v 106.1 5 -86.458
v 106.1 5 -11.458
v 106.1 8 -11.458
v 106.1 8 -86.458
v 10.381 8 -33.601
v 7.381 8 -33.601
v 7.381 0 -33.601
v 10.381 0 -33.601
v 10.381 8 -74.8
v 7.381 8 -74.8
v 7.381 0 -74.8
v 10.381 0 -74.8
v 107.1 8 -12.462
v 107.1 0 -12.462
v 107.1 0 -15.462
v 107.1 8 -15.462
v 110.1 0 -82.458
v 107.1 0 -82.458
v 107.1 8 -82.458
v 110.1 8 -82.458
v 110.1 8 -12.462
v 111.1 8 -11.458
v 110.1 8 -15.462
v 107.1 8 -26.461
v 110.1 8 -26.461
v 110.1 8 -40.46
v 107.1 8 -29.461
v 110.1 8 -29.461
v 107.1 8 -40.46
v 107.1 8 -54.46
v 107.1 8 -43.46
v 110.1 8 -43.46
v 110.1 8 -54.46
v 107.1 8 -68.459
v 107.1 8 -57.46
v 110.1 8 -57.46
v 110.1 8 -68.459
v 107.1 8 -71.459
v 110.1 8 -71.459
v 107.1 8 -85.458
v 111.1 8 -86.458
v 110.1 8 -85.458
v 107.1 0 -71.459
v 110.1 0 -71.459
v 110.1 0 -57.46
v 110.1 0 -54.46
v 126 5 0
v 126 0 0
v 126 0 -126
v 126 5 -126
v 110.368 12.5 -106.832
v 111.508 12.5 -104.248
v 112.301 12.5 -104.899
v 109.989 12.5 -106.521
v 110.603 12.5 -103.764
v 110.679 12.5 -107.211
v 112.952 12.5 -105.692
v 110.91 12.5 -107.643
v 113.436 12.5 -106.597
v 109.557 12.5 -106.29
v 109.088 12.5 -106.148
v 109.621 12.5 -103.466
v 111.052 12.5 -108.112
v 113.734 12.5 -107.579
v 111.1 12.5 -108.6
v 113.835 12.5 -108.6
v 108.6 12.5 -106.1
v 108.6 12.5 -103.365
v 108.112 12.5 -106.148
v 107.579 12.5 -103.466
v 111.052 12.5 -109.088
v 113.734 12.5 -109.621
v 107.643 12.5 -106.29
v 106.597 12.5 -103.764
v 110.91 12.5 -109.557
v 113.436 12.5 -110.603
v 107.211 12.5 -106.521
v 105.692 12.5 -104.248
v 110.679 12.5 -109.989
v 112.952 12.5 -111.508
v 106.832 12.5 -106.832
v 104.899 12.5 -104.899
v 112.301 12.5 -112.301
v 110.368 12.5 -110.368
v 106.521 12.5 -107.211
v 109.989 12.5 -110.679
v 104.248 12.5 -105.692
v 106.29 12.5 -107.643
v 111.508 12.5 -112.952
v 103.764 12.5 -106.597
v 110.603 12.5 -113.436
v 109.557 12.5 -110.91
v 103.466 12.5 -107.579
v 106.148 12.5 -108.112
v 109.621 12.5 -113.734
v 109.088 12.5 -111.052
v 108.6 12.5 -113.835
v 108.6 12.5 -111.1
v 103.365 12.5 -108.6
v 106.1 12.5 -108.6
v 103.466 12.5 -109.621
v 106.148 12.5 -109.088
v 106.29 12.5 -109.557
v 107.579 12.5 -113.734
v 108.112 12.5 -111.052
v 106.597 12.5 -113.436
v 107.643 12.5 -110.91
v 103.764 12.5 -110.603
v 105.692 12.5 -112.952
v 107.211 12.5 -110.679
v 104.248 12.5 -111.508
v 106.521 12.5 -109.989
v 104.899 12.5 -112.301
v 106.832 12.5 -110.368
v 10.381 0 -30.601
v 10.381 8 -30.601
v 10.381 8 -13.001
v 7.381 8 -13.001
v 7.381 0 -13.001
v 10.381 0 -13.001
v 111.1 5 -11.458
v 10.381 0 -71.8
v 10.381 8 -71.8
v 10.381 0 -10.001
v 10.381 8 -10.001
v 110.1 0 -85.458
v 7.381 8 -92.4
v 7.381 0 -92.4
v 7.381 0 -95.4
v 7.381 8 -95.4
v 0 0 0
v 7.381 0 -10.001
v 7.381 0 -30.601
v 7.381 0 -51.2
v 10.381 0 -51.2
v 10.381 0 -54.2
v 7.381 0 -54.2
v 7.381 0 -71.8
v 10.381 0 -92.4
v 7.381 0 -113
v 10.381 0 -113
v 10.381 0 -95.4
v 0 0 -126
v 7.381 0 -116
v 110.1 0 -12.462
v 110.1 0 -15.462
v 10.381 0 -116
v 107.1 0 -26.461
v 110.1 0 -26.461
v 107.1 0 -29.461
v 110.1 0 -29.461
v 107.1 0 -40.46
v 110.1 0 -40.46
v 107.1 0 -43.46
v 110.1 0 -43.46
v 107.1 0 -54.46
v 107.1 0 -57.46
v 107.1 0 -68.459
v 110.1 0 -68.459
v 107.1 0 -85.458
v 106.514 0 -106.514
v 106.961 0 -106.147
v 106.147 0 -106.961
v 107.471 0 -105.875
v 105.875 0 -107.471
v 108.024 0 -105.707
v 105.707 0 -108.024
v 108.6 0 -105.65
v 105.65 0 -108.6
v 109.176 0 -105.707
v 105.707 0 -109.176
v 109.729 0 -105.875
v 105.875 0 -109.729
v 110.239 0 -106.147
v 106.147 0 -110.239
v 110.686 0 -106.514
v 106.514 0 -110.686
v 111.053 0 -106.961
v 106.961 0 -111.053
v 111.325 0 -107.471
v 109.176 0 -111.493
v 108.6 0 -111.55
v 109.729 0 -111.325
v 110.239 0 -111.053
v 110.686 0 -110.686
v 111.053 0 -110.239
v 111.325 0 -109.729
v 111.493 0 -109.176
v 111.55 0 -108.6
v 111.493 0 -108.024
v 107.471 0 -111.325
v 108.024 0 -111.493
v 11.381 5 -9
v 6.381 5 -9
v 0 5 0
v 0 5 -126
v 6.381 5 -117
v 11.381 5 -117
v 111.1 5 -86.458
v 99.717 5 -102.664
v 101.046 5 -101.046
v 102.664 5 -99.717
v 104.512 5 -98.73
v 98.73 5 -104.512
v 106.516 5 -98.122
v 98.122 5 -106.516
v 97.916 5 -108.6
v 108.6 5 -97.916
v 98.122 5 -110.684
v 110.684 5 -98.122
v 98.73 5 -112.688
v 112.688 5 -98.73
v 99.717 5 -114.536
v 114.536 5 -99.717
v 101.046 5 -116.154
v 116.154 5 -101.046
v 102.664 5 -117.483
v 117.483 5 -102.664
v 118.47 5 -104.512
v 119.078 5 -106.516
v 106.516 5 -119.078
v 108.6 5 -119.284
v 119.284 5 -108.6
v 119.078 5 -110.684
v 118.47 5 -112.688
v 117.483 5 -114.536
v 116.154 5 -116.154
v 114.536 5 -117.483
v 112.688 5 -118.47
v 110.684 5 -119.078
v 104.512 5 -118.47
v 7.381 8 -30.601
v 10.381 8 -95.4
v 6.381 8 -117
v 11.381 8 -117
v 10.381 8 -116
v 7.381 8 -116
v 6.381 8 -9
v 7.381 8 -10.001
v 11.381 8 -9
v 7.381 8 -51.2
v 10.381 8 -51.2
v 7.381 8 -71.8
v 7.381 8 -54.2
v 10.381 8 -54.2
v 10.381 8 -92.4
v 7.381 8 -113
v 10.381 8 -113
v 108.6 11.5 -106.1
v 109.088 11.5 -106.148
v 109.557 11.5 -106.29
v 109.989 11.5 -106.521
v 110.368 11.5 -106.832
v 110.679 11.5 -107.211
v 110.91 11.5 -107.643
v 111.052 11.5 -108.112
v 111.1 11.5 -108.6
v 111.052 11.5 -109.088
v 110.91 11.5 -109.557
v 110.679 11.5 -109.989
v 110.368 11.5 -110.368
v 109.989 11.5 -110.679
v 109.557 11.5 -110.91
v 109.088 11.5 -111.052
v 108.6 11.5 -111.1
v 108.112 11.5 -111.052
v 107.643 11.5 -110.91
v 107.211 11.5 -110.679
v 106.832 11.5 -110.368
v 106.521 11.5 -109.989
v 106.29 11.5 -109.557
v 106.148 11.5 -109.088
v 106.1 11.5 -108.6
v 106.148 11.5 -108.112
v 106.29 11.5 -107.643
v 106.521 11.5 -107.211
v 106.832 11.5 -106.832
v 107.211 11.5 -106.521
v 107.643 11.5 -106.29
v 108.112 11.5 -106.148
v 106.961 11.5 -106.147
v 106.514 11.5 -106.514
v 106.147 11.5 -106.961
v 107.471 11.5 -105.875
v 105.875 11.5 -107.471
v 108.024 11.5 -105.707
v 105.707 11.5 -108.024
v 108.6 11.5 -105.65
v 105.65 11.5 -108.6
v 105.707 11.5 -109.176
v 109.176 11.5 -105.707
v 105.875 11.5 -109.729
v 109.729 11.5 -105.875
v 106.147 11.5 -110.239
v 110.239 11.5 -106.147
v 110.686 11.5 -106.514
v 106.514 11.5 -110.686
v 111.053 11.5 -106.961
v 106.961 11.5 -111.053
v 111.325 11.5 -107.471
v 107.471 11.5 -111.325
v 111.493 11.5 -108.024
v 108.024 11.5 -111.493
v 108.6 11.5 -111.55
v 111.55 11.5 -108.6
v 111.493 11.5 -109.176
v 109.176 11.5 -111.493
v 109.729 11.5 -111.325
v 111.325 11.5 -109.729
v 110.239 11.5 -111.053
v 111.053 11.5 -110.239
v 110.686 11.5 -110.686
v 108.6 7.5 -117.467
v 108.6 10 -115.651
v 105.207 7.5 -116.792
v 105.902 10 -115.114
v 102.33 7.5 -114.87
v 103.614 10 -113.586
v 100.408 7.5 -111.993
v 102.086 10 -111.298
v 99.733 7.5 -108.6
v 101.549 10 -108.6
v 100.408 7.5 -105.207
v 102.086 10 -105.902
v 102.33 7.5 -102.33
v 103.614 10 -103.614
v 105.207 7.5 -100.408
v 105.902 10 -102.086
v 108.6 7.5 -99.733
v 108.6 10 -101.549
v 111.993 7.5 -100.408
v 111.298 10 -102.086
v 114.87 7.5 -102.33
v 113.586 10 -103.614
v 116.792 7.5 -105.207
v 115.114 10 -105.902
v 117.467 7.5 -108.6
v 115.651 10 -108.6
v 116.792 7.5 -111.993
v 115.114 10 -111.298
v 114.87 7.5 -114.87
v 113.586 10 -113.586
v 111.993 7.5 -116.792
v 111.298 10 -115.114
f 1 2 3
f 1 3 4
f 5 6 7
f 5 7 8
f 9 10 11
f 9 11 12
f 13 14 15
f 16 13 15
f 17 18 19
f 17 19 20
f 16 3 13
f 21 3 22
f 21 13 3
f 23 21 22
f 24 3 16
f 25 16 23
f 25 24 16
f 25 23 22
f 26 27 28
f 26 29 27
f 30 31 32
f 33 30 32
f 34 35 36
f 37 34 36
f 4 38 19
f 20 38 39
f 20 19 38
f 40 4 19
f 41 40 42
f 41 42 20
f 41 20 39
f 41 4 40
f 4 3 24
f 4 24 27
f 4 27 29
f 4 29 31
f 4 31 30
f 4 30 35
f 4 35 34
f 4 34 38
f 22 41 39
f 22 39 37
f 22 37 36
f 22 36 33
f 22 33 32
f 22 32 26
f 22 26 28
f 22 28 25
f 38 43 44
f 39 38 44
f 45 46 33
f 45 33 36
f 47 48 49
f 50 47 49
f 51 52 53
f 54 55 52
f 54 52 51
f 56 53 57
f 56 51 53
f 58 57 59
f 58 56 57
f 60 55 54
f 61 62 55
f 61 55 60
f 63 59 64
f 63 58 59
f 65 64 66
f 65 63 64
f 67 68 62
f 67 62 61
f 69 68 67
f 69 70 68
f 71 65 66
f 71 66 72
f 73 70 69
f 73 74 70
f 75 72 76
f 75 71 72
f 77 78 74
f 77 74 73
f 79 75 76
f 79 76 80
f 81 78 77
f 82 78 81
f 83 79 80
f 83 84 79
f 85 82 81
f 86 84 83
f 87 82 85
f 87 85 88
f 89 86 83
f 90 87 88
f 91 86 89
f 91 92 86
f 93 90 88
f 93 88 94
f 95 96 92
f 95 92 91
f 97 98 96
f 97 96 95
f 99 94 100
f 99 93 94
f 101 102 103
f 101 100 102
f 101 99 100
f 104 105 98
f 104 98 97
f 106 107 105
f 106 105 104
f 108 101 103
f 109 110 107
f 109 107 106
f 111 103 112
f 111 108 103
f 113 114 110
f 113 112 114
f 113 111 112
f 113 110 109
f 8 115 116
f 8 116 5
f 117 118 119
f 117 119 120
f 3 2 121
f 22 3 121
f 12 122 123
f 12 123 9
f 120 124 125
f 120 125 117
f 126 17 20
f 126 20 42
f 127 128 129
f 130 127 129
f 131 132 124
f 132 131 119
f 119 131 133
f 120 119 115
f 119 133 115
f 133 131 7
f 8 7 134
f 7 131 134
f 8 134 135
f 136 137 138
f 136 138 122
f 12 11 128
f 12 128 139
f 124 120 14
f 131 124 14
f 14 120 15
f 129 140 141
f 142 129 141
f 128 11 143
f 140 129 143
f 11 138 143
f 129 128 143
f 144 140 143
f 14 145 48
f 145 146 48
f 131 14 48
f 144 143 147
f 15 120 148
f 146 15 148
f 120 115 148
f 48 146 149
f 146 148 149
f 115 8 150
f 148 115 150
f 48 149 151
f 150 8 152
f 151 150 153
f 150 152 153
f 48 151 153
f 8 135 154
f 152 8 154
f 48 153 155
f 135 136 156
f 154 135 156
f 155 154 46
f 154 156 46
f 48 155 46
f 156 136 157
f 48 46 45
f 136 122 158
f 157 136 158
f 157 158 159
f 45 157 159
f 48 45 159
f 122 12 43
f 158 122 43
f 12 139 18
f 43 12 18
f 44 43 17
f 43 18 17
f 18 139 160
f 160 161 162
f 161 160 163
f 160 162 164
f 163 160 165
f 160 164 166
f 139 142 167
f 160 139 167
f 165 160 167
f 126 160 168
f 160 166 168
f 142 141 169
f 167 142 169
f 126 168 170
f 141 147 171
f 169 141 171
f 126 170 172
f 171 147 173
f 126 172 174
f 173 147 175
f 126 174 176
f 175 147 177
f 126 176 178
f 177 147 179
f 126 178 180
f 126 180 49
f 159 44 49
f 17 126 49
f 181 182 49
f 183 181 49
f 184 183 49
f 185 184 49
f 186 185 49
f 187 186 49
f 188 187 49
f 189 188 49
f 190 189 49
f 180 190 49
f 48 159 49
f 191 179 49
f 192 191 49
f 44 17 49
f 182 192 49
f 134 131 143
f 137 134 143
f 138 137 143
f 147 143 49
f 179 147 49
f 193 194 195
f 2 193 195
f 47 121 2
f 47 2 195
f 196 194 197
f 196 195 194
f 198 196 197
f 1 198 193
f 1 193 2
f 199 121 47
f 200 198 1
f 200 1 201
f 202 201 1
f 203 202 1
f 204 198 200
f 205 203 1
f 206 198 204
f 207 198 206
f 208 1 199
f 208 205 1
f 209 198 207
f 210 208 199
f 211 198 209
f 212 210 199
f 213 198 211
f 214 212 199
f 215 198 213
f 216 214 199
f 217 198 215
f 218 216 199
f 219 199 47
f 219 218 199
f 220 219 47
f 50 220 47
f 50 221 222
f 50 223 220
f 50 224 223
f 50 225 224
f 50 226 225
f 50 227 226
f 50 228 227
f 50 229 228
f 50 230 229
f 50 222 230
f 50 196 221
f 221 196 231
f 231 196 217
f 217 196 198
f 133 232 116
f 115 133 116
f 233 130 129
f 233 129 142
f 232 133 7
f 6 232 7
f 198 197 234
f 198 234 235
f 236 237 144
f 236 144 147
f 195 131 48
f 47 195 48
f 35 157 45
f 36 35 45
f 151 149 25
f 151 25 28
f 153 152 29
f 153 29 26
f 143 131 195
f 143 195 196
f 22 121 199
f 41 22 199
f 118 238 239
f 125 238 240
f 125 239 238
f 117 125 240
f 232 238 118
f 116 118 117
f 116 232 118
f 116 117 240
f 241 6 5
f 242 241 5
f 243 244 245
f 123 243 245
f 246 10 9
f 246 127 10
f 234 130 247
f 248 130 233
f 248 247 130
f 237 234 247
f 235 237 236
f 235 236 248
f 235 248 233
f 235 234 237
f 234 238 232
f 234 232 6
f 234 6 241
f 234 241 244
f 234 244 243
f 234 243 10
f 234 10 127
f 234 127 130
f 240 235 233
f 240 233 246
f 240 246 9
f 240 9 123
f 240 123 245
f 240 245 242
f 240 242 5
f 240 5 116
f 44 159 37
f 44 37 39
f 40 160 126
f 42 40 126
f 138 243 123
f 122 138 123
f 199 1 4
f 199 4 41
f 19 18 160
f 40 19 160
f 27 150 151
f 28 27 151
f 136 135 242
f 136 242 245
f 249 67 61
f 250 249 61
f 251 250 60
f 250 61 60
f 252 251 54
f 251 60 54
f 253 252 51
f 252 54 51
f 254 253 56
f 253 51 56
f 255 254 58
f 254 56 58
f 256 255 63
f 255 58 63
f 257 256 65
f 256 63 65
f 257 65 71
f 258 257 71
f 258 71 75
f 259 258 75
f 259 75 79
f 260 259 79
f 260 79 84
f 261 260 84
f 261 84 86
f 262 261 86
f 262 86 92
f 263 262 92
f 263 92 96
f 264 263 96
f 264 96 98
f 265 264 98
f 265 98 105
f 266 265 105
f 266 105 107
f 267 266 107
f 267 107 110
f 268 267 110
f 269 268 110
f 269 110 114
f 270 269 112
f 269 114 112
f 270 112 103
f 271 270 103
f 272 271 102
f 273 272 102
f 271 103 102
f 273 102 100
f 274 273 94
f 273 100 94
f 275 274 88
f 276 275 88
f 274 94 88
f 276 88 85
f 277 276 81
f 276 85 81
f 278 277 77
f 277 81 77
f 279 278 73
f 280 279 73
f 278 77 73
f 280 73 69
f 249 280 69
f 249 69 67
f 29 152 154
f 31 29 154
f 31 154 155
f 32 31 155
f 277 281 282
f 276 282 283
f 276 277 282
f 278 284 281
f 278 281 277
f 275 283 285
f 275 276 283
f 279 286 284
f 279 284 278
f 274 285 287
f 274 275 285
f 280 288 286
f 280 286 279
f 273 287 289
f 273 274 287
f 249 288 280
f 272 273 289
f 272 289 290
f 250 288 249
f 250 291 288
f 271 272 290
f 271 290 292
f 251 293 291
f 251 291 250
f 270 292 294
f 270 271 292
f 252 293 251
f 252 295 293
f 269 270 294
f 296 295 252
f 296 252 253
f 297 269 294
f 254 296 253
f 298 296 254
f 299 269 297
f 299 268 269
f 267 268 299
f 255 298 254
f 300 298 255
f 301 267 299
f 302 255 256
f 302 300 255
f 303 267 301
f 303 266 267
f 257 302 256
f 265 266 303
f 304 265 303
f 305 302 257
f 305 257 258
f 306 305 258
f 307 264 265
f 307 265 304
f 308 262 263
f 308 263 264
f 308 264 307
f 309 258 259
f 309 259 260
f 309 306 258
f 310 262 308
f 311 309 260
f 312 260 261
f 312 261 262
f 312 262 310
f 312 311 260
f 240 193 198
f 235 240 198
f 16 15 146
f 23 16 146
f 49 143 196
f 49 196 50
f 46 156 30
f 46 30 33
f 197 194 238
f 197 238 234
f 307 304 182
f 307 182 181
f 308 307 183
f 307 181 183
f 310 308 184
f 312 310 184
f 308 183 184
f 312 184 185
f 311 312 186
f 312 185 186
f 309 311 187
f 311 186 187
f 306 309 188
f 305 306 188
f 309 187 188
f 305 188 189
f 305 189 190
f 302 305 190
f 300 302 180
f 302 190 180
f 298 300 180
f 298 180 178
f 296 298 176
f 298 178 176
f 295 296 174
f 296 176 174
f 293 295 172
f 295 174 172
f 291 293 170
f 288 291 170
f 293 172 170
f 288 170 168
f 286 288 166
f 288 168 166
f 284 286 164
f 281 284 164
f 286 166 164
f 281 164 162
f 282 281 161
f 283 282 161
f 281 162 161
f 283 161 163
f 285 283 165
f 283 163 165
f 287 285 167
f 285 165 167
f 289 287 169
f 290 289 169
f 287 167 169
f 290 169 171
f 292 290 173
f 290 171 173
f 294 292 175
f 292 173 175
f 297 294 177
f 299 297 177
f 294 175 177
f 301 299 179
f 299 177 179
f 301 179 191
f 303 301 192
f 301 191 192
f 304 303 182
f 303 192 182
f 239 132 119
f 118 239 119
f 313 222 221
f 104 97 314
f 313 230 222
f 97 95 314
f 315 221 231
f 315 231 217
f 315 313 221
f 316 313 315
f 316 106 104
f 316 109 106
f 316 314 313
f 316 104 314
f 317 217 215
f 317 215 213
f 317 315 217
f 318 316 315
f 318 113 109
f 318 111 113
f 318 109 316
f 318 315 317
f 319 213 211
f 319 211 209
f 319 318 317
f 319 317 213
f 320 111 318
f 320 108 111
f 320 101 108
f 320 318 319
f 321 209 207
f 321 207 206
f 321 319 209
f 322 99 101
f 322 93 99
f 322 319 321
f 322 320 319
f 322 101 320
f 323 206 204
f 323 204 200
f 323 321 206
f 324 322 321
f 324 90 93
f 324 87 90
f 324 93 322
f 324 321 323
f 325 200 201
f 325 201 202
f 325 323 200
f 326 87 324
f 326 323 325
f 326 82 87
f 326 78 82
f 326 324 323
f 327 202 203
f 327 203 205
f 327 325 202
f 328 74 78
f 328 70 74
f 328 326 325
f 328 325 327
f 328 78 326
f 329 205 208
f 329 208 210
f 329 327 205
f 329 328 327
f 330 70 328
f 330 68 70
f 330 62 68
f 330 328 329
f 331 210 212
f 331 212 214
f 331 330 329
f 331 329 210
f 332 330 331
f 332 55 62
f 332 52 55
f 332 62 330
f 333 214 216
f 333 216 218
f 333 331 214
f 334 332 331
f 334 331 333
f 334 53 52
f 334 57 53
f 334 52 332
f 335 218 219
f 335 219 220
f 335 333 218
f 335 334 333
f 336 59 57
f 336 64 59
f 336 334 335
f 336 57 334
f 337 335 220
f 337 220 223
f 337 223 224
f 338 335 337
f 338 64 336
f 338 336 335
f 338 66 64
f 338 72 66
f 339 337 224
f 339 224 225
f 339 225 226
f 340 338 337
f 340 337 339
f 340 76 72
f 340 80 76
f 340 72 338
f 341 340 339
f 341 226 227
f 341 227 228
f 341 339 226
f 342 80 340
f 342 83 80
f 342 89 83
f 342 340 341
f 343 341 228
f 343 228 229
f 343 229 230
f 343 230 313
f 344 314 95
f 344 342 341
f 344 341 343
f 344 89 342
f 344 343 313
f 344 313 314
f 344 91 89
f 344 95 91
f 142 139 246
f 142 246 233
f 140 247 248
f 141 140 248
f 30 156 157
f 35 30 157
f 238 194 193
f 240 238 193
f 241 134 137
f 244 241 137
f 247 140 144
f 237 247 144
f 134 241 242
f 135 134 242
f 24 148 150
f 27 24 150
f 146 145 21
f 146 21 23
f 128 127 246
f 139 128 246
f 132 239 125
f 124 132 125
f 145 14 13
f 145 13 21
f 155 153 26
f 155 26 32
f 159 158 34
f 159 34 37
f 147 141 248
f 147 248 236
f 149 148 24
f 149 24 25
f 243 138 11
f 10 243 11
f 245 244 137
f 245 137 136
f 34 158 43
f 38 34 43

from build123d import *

# Parameters (mm, degrees)
SKETCH1_W           = 126
SKETCH1_H           = 126
BOSS_EXTRUDE1_DEPTH = 5
SKETCH3_R           = 12.5
BOSS_EXTRUDE2_DEPTH = 7.5
SKETCH4_R           = 2.95
CUT_EXTRUDE1_DEPTH  = 11.5
SKETCH6_R           = 2.5
CUT_EXTRUDE2_DEPTH  = 179.628805068
CHAMFER1_SIZE       = 10
CHAMFER1_SIZE_2     = 7.26542528
SKETCH9_W           = 5
SKETCH9_H           = 75
BOSS_EXTRUDE4_DEPTH = 3
SKETCH10_W          = 3
SKETCH10_H          = 3
CUT_EXTRUDE4_DEPTH  = 179.370401132
SKETCH11_W          = 5
SKETCH11_H          = 108
BOSS_EXTRUDE5_DEPTH = 3
SKETCH12_W          = 3
SKETCH12_H          = 3
CUT_EXTRUDE5_DEPTH  = 179.370401132


with BuildPart() as part:
    # Sketch1 → Boss-Extrude1 (new body)
    with BuildSketch(Plane(origin=(0, 0, 0), x_dir=(1, 0, 0), z_dir=(0, 1, 0))):
        with Locations((63, 63)):
            Rectangle(SKETCH1_W, SKETCH1_H)
    extrude(amount=BOSS_EXTRUDE1_DEPTH)

    # Sketch3 → Boss-Extrude2 (add)
    with BuildSketch(Plane(origin=(0, 5, 0), x_dir=(1, 0, 0), z_dir=(0, 1, 0))):
        with Locations(Location((108.6, 108.6, 0), (0, 0, 90))):
            Circle(SKETCH3_R)
    extrude(amount=BOSS_EXTRUDE2_DEPTH)

    # Sketch4 → Cut-Extrude1 (cut)
    with BuildSketch(Plane.XZ):
        with Locations(Location((108.6, -108.6, 0), (0, 0, 270))):
            Circle(SKETCH4_R)
    extrude(amount=-CUT_EXTRUDE1_DEPTH, mode=Mode.SUBTRACT)

    # Sketch6 → Cut-Extrude2 (cut, through all)
    with BuildSketch(Plane(origin=(0, 12.5, 0), x_dir=(1, 0, 0), z_dir=(0, 1, 0))):
        with Locations(Location((108.6, 108.6, 0), (0, 0, 270))):
            Circle(SKETCH6_R)
    extrude(amount=-CUT_EXTRUDE2_DEPTH, mode=Mode.SUBTRACT)

    # Chamfer1
    # the kernel refuses this chamfer: 10, 7.26542528 mm, written as the material it takes off along each edge
    with BuildSketch(Plane(origin=(108.6, 12.5, -108.6), x_dir=(0, 0, -1), z_dir=(1, 0, 0))) as chamfer1_piece_1_section:
        Polygon((12.5, -CHAMFER1_SIZE), (12.5 - CHAMFER1_SIZE_2, 0), (12.5, 0), align=None)
    chamfer1_piece_1 = revolve(axis=Axis((108.6, 12.5, -108.6), (0, 1, 0)), mode=Mode.PRIVATE)
    chamfer1_piece_1 = split(chamfer1_piece_1, bisect_by=Plane(origin=(108.6, 5, -100.650989912), z_dir=(0, 1, 0)), keep=Keep.TOP, mode=Mode.PRIVATE)
    add(chamfer1_piece_1, mode=Mode.SUBTRACT)

    # Sketch9 → Boss-Extrude4 (add)
    with BuildSketch(Plane(origin=(0, 5, 0), x_dir=(1, 0, 0), z_dir=(0, 1, 0))):
        with Locations((108.6, 48.95817816)):
            Rectangle(SKETCH9_W, SKETCH9_H)
    extrude(amount=BOSS_EXTRUDE4_DEPTH)

    # Sketch10 → Cut-Extrude4 (cut, through all)
    with BuildSketch(Plane(origin=(0, 8, 0), x_dir=(1, 0, 0), z_dir=(0, 1, 0))):
        with Locations((108.6, 83.95817816)):
            Rectangle(SKETCH10_W, SKETCH10_H)
        with Locations((108.6, 69.958932274)):
            Rectangle(SKETCH10_W, SKETCH10_H)
        with Locations((108.6, 55.959686388)):
            Rectangle(SKETCH10_W, SKETCH10_H)
        with Locations((108.6, 41.960440502)):
            Rectangle(SKETCH10_W, SKETCH10_H)
        with Locations((108.6, 27.961194616)):
            Rectangle(SKETCH10_W, SKETCH10_H)
        with Locations((108.6, 13.96194873)):
            Rectangle(SKETCH10_W, SKETCH10_H)
    extrude(amount=-CUT_EXTRUDE4_DEPTH, mode=Mode.SUBTRACT)

    # Sketch11 → Boss-Extrude5 (add)
    with BuildSketch(Plane(origin=(0, 5, 0), x_dir=(1, 0, 0), z_dir=(0, 1, 0))):
        with Locations((8.881061813, 63)):
            Rectangle(SKETCH11_W, SKETCH11_H)
    extrude(amount=BOSS_EXTRUDE5_DEPTH)

    # Sketch12 → Cut-Extrude5 (cut, through all)
    with BuildSketch(Plane(origin=(0, 8, 0), x_dir=(1, 0, 0), z_dir=(0, 1, 0))):
        with Locations((8.881061813, 114.5)):
            Rectangle(SKETCH12_W, SKETCH12_H)
        with Locations((8.881061813, 93.900163021)):
            Rectangle(SKETCH12_W, SKETCH12_H)
        with Locations((8.881061813, 73.300326041)):
            Rectangle(SKETCH12_W, SKETCH12_H)
        with Locations((8.881061813, 52.700489062)):
            Rectangle(SKETCH12_W, SKETCH12_H)
        with Locations((8.881061813, 32.100652082)):
            Rectangle(SKETCH12_W, SKETCH12_H)
        with Locations((8.881061813, 11.500815103)):
            Rectangle(SKETCH12_W, SKETCH12_H)
    extrude(amount=-CUT_EXTRUDE5_DEPTH, mode=Mode.SUBTRACT)


solid = part.part
